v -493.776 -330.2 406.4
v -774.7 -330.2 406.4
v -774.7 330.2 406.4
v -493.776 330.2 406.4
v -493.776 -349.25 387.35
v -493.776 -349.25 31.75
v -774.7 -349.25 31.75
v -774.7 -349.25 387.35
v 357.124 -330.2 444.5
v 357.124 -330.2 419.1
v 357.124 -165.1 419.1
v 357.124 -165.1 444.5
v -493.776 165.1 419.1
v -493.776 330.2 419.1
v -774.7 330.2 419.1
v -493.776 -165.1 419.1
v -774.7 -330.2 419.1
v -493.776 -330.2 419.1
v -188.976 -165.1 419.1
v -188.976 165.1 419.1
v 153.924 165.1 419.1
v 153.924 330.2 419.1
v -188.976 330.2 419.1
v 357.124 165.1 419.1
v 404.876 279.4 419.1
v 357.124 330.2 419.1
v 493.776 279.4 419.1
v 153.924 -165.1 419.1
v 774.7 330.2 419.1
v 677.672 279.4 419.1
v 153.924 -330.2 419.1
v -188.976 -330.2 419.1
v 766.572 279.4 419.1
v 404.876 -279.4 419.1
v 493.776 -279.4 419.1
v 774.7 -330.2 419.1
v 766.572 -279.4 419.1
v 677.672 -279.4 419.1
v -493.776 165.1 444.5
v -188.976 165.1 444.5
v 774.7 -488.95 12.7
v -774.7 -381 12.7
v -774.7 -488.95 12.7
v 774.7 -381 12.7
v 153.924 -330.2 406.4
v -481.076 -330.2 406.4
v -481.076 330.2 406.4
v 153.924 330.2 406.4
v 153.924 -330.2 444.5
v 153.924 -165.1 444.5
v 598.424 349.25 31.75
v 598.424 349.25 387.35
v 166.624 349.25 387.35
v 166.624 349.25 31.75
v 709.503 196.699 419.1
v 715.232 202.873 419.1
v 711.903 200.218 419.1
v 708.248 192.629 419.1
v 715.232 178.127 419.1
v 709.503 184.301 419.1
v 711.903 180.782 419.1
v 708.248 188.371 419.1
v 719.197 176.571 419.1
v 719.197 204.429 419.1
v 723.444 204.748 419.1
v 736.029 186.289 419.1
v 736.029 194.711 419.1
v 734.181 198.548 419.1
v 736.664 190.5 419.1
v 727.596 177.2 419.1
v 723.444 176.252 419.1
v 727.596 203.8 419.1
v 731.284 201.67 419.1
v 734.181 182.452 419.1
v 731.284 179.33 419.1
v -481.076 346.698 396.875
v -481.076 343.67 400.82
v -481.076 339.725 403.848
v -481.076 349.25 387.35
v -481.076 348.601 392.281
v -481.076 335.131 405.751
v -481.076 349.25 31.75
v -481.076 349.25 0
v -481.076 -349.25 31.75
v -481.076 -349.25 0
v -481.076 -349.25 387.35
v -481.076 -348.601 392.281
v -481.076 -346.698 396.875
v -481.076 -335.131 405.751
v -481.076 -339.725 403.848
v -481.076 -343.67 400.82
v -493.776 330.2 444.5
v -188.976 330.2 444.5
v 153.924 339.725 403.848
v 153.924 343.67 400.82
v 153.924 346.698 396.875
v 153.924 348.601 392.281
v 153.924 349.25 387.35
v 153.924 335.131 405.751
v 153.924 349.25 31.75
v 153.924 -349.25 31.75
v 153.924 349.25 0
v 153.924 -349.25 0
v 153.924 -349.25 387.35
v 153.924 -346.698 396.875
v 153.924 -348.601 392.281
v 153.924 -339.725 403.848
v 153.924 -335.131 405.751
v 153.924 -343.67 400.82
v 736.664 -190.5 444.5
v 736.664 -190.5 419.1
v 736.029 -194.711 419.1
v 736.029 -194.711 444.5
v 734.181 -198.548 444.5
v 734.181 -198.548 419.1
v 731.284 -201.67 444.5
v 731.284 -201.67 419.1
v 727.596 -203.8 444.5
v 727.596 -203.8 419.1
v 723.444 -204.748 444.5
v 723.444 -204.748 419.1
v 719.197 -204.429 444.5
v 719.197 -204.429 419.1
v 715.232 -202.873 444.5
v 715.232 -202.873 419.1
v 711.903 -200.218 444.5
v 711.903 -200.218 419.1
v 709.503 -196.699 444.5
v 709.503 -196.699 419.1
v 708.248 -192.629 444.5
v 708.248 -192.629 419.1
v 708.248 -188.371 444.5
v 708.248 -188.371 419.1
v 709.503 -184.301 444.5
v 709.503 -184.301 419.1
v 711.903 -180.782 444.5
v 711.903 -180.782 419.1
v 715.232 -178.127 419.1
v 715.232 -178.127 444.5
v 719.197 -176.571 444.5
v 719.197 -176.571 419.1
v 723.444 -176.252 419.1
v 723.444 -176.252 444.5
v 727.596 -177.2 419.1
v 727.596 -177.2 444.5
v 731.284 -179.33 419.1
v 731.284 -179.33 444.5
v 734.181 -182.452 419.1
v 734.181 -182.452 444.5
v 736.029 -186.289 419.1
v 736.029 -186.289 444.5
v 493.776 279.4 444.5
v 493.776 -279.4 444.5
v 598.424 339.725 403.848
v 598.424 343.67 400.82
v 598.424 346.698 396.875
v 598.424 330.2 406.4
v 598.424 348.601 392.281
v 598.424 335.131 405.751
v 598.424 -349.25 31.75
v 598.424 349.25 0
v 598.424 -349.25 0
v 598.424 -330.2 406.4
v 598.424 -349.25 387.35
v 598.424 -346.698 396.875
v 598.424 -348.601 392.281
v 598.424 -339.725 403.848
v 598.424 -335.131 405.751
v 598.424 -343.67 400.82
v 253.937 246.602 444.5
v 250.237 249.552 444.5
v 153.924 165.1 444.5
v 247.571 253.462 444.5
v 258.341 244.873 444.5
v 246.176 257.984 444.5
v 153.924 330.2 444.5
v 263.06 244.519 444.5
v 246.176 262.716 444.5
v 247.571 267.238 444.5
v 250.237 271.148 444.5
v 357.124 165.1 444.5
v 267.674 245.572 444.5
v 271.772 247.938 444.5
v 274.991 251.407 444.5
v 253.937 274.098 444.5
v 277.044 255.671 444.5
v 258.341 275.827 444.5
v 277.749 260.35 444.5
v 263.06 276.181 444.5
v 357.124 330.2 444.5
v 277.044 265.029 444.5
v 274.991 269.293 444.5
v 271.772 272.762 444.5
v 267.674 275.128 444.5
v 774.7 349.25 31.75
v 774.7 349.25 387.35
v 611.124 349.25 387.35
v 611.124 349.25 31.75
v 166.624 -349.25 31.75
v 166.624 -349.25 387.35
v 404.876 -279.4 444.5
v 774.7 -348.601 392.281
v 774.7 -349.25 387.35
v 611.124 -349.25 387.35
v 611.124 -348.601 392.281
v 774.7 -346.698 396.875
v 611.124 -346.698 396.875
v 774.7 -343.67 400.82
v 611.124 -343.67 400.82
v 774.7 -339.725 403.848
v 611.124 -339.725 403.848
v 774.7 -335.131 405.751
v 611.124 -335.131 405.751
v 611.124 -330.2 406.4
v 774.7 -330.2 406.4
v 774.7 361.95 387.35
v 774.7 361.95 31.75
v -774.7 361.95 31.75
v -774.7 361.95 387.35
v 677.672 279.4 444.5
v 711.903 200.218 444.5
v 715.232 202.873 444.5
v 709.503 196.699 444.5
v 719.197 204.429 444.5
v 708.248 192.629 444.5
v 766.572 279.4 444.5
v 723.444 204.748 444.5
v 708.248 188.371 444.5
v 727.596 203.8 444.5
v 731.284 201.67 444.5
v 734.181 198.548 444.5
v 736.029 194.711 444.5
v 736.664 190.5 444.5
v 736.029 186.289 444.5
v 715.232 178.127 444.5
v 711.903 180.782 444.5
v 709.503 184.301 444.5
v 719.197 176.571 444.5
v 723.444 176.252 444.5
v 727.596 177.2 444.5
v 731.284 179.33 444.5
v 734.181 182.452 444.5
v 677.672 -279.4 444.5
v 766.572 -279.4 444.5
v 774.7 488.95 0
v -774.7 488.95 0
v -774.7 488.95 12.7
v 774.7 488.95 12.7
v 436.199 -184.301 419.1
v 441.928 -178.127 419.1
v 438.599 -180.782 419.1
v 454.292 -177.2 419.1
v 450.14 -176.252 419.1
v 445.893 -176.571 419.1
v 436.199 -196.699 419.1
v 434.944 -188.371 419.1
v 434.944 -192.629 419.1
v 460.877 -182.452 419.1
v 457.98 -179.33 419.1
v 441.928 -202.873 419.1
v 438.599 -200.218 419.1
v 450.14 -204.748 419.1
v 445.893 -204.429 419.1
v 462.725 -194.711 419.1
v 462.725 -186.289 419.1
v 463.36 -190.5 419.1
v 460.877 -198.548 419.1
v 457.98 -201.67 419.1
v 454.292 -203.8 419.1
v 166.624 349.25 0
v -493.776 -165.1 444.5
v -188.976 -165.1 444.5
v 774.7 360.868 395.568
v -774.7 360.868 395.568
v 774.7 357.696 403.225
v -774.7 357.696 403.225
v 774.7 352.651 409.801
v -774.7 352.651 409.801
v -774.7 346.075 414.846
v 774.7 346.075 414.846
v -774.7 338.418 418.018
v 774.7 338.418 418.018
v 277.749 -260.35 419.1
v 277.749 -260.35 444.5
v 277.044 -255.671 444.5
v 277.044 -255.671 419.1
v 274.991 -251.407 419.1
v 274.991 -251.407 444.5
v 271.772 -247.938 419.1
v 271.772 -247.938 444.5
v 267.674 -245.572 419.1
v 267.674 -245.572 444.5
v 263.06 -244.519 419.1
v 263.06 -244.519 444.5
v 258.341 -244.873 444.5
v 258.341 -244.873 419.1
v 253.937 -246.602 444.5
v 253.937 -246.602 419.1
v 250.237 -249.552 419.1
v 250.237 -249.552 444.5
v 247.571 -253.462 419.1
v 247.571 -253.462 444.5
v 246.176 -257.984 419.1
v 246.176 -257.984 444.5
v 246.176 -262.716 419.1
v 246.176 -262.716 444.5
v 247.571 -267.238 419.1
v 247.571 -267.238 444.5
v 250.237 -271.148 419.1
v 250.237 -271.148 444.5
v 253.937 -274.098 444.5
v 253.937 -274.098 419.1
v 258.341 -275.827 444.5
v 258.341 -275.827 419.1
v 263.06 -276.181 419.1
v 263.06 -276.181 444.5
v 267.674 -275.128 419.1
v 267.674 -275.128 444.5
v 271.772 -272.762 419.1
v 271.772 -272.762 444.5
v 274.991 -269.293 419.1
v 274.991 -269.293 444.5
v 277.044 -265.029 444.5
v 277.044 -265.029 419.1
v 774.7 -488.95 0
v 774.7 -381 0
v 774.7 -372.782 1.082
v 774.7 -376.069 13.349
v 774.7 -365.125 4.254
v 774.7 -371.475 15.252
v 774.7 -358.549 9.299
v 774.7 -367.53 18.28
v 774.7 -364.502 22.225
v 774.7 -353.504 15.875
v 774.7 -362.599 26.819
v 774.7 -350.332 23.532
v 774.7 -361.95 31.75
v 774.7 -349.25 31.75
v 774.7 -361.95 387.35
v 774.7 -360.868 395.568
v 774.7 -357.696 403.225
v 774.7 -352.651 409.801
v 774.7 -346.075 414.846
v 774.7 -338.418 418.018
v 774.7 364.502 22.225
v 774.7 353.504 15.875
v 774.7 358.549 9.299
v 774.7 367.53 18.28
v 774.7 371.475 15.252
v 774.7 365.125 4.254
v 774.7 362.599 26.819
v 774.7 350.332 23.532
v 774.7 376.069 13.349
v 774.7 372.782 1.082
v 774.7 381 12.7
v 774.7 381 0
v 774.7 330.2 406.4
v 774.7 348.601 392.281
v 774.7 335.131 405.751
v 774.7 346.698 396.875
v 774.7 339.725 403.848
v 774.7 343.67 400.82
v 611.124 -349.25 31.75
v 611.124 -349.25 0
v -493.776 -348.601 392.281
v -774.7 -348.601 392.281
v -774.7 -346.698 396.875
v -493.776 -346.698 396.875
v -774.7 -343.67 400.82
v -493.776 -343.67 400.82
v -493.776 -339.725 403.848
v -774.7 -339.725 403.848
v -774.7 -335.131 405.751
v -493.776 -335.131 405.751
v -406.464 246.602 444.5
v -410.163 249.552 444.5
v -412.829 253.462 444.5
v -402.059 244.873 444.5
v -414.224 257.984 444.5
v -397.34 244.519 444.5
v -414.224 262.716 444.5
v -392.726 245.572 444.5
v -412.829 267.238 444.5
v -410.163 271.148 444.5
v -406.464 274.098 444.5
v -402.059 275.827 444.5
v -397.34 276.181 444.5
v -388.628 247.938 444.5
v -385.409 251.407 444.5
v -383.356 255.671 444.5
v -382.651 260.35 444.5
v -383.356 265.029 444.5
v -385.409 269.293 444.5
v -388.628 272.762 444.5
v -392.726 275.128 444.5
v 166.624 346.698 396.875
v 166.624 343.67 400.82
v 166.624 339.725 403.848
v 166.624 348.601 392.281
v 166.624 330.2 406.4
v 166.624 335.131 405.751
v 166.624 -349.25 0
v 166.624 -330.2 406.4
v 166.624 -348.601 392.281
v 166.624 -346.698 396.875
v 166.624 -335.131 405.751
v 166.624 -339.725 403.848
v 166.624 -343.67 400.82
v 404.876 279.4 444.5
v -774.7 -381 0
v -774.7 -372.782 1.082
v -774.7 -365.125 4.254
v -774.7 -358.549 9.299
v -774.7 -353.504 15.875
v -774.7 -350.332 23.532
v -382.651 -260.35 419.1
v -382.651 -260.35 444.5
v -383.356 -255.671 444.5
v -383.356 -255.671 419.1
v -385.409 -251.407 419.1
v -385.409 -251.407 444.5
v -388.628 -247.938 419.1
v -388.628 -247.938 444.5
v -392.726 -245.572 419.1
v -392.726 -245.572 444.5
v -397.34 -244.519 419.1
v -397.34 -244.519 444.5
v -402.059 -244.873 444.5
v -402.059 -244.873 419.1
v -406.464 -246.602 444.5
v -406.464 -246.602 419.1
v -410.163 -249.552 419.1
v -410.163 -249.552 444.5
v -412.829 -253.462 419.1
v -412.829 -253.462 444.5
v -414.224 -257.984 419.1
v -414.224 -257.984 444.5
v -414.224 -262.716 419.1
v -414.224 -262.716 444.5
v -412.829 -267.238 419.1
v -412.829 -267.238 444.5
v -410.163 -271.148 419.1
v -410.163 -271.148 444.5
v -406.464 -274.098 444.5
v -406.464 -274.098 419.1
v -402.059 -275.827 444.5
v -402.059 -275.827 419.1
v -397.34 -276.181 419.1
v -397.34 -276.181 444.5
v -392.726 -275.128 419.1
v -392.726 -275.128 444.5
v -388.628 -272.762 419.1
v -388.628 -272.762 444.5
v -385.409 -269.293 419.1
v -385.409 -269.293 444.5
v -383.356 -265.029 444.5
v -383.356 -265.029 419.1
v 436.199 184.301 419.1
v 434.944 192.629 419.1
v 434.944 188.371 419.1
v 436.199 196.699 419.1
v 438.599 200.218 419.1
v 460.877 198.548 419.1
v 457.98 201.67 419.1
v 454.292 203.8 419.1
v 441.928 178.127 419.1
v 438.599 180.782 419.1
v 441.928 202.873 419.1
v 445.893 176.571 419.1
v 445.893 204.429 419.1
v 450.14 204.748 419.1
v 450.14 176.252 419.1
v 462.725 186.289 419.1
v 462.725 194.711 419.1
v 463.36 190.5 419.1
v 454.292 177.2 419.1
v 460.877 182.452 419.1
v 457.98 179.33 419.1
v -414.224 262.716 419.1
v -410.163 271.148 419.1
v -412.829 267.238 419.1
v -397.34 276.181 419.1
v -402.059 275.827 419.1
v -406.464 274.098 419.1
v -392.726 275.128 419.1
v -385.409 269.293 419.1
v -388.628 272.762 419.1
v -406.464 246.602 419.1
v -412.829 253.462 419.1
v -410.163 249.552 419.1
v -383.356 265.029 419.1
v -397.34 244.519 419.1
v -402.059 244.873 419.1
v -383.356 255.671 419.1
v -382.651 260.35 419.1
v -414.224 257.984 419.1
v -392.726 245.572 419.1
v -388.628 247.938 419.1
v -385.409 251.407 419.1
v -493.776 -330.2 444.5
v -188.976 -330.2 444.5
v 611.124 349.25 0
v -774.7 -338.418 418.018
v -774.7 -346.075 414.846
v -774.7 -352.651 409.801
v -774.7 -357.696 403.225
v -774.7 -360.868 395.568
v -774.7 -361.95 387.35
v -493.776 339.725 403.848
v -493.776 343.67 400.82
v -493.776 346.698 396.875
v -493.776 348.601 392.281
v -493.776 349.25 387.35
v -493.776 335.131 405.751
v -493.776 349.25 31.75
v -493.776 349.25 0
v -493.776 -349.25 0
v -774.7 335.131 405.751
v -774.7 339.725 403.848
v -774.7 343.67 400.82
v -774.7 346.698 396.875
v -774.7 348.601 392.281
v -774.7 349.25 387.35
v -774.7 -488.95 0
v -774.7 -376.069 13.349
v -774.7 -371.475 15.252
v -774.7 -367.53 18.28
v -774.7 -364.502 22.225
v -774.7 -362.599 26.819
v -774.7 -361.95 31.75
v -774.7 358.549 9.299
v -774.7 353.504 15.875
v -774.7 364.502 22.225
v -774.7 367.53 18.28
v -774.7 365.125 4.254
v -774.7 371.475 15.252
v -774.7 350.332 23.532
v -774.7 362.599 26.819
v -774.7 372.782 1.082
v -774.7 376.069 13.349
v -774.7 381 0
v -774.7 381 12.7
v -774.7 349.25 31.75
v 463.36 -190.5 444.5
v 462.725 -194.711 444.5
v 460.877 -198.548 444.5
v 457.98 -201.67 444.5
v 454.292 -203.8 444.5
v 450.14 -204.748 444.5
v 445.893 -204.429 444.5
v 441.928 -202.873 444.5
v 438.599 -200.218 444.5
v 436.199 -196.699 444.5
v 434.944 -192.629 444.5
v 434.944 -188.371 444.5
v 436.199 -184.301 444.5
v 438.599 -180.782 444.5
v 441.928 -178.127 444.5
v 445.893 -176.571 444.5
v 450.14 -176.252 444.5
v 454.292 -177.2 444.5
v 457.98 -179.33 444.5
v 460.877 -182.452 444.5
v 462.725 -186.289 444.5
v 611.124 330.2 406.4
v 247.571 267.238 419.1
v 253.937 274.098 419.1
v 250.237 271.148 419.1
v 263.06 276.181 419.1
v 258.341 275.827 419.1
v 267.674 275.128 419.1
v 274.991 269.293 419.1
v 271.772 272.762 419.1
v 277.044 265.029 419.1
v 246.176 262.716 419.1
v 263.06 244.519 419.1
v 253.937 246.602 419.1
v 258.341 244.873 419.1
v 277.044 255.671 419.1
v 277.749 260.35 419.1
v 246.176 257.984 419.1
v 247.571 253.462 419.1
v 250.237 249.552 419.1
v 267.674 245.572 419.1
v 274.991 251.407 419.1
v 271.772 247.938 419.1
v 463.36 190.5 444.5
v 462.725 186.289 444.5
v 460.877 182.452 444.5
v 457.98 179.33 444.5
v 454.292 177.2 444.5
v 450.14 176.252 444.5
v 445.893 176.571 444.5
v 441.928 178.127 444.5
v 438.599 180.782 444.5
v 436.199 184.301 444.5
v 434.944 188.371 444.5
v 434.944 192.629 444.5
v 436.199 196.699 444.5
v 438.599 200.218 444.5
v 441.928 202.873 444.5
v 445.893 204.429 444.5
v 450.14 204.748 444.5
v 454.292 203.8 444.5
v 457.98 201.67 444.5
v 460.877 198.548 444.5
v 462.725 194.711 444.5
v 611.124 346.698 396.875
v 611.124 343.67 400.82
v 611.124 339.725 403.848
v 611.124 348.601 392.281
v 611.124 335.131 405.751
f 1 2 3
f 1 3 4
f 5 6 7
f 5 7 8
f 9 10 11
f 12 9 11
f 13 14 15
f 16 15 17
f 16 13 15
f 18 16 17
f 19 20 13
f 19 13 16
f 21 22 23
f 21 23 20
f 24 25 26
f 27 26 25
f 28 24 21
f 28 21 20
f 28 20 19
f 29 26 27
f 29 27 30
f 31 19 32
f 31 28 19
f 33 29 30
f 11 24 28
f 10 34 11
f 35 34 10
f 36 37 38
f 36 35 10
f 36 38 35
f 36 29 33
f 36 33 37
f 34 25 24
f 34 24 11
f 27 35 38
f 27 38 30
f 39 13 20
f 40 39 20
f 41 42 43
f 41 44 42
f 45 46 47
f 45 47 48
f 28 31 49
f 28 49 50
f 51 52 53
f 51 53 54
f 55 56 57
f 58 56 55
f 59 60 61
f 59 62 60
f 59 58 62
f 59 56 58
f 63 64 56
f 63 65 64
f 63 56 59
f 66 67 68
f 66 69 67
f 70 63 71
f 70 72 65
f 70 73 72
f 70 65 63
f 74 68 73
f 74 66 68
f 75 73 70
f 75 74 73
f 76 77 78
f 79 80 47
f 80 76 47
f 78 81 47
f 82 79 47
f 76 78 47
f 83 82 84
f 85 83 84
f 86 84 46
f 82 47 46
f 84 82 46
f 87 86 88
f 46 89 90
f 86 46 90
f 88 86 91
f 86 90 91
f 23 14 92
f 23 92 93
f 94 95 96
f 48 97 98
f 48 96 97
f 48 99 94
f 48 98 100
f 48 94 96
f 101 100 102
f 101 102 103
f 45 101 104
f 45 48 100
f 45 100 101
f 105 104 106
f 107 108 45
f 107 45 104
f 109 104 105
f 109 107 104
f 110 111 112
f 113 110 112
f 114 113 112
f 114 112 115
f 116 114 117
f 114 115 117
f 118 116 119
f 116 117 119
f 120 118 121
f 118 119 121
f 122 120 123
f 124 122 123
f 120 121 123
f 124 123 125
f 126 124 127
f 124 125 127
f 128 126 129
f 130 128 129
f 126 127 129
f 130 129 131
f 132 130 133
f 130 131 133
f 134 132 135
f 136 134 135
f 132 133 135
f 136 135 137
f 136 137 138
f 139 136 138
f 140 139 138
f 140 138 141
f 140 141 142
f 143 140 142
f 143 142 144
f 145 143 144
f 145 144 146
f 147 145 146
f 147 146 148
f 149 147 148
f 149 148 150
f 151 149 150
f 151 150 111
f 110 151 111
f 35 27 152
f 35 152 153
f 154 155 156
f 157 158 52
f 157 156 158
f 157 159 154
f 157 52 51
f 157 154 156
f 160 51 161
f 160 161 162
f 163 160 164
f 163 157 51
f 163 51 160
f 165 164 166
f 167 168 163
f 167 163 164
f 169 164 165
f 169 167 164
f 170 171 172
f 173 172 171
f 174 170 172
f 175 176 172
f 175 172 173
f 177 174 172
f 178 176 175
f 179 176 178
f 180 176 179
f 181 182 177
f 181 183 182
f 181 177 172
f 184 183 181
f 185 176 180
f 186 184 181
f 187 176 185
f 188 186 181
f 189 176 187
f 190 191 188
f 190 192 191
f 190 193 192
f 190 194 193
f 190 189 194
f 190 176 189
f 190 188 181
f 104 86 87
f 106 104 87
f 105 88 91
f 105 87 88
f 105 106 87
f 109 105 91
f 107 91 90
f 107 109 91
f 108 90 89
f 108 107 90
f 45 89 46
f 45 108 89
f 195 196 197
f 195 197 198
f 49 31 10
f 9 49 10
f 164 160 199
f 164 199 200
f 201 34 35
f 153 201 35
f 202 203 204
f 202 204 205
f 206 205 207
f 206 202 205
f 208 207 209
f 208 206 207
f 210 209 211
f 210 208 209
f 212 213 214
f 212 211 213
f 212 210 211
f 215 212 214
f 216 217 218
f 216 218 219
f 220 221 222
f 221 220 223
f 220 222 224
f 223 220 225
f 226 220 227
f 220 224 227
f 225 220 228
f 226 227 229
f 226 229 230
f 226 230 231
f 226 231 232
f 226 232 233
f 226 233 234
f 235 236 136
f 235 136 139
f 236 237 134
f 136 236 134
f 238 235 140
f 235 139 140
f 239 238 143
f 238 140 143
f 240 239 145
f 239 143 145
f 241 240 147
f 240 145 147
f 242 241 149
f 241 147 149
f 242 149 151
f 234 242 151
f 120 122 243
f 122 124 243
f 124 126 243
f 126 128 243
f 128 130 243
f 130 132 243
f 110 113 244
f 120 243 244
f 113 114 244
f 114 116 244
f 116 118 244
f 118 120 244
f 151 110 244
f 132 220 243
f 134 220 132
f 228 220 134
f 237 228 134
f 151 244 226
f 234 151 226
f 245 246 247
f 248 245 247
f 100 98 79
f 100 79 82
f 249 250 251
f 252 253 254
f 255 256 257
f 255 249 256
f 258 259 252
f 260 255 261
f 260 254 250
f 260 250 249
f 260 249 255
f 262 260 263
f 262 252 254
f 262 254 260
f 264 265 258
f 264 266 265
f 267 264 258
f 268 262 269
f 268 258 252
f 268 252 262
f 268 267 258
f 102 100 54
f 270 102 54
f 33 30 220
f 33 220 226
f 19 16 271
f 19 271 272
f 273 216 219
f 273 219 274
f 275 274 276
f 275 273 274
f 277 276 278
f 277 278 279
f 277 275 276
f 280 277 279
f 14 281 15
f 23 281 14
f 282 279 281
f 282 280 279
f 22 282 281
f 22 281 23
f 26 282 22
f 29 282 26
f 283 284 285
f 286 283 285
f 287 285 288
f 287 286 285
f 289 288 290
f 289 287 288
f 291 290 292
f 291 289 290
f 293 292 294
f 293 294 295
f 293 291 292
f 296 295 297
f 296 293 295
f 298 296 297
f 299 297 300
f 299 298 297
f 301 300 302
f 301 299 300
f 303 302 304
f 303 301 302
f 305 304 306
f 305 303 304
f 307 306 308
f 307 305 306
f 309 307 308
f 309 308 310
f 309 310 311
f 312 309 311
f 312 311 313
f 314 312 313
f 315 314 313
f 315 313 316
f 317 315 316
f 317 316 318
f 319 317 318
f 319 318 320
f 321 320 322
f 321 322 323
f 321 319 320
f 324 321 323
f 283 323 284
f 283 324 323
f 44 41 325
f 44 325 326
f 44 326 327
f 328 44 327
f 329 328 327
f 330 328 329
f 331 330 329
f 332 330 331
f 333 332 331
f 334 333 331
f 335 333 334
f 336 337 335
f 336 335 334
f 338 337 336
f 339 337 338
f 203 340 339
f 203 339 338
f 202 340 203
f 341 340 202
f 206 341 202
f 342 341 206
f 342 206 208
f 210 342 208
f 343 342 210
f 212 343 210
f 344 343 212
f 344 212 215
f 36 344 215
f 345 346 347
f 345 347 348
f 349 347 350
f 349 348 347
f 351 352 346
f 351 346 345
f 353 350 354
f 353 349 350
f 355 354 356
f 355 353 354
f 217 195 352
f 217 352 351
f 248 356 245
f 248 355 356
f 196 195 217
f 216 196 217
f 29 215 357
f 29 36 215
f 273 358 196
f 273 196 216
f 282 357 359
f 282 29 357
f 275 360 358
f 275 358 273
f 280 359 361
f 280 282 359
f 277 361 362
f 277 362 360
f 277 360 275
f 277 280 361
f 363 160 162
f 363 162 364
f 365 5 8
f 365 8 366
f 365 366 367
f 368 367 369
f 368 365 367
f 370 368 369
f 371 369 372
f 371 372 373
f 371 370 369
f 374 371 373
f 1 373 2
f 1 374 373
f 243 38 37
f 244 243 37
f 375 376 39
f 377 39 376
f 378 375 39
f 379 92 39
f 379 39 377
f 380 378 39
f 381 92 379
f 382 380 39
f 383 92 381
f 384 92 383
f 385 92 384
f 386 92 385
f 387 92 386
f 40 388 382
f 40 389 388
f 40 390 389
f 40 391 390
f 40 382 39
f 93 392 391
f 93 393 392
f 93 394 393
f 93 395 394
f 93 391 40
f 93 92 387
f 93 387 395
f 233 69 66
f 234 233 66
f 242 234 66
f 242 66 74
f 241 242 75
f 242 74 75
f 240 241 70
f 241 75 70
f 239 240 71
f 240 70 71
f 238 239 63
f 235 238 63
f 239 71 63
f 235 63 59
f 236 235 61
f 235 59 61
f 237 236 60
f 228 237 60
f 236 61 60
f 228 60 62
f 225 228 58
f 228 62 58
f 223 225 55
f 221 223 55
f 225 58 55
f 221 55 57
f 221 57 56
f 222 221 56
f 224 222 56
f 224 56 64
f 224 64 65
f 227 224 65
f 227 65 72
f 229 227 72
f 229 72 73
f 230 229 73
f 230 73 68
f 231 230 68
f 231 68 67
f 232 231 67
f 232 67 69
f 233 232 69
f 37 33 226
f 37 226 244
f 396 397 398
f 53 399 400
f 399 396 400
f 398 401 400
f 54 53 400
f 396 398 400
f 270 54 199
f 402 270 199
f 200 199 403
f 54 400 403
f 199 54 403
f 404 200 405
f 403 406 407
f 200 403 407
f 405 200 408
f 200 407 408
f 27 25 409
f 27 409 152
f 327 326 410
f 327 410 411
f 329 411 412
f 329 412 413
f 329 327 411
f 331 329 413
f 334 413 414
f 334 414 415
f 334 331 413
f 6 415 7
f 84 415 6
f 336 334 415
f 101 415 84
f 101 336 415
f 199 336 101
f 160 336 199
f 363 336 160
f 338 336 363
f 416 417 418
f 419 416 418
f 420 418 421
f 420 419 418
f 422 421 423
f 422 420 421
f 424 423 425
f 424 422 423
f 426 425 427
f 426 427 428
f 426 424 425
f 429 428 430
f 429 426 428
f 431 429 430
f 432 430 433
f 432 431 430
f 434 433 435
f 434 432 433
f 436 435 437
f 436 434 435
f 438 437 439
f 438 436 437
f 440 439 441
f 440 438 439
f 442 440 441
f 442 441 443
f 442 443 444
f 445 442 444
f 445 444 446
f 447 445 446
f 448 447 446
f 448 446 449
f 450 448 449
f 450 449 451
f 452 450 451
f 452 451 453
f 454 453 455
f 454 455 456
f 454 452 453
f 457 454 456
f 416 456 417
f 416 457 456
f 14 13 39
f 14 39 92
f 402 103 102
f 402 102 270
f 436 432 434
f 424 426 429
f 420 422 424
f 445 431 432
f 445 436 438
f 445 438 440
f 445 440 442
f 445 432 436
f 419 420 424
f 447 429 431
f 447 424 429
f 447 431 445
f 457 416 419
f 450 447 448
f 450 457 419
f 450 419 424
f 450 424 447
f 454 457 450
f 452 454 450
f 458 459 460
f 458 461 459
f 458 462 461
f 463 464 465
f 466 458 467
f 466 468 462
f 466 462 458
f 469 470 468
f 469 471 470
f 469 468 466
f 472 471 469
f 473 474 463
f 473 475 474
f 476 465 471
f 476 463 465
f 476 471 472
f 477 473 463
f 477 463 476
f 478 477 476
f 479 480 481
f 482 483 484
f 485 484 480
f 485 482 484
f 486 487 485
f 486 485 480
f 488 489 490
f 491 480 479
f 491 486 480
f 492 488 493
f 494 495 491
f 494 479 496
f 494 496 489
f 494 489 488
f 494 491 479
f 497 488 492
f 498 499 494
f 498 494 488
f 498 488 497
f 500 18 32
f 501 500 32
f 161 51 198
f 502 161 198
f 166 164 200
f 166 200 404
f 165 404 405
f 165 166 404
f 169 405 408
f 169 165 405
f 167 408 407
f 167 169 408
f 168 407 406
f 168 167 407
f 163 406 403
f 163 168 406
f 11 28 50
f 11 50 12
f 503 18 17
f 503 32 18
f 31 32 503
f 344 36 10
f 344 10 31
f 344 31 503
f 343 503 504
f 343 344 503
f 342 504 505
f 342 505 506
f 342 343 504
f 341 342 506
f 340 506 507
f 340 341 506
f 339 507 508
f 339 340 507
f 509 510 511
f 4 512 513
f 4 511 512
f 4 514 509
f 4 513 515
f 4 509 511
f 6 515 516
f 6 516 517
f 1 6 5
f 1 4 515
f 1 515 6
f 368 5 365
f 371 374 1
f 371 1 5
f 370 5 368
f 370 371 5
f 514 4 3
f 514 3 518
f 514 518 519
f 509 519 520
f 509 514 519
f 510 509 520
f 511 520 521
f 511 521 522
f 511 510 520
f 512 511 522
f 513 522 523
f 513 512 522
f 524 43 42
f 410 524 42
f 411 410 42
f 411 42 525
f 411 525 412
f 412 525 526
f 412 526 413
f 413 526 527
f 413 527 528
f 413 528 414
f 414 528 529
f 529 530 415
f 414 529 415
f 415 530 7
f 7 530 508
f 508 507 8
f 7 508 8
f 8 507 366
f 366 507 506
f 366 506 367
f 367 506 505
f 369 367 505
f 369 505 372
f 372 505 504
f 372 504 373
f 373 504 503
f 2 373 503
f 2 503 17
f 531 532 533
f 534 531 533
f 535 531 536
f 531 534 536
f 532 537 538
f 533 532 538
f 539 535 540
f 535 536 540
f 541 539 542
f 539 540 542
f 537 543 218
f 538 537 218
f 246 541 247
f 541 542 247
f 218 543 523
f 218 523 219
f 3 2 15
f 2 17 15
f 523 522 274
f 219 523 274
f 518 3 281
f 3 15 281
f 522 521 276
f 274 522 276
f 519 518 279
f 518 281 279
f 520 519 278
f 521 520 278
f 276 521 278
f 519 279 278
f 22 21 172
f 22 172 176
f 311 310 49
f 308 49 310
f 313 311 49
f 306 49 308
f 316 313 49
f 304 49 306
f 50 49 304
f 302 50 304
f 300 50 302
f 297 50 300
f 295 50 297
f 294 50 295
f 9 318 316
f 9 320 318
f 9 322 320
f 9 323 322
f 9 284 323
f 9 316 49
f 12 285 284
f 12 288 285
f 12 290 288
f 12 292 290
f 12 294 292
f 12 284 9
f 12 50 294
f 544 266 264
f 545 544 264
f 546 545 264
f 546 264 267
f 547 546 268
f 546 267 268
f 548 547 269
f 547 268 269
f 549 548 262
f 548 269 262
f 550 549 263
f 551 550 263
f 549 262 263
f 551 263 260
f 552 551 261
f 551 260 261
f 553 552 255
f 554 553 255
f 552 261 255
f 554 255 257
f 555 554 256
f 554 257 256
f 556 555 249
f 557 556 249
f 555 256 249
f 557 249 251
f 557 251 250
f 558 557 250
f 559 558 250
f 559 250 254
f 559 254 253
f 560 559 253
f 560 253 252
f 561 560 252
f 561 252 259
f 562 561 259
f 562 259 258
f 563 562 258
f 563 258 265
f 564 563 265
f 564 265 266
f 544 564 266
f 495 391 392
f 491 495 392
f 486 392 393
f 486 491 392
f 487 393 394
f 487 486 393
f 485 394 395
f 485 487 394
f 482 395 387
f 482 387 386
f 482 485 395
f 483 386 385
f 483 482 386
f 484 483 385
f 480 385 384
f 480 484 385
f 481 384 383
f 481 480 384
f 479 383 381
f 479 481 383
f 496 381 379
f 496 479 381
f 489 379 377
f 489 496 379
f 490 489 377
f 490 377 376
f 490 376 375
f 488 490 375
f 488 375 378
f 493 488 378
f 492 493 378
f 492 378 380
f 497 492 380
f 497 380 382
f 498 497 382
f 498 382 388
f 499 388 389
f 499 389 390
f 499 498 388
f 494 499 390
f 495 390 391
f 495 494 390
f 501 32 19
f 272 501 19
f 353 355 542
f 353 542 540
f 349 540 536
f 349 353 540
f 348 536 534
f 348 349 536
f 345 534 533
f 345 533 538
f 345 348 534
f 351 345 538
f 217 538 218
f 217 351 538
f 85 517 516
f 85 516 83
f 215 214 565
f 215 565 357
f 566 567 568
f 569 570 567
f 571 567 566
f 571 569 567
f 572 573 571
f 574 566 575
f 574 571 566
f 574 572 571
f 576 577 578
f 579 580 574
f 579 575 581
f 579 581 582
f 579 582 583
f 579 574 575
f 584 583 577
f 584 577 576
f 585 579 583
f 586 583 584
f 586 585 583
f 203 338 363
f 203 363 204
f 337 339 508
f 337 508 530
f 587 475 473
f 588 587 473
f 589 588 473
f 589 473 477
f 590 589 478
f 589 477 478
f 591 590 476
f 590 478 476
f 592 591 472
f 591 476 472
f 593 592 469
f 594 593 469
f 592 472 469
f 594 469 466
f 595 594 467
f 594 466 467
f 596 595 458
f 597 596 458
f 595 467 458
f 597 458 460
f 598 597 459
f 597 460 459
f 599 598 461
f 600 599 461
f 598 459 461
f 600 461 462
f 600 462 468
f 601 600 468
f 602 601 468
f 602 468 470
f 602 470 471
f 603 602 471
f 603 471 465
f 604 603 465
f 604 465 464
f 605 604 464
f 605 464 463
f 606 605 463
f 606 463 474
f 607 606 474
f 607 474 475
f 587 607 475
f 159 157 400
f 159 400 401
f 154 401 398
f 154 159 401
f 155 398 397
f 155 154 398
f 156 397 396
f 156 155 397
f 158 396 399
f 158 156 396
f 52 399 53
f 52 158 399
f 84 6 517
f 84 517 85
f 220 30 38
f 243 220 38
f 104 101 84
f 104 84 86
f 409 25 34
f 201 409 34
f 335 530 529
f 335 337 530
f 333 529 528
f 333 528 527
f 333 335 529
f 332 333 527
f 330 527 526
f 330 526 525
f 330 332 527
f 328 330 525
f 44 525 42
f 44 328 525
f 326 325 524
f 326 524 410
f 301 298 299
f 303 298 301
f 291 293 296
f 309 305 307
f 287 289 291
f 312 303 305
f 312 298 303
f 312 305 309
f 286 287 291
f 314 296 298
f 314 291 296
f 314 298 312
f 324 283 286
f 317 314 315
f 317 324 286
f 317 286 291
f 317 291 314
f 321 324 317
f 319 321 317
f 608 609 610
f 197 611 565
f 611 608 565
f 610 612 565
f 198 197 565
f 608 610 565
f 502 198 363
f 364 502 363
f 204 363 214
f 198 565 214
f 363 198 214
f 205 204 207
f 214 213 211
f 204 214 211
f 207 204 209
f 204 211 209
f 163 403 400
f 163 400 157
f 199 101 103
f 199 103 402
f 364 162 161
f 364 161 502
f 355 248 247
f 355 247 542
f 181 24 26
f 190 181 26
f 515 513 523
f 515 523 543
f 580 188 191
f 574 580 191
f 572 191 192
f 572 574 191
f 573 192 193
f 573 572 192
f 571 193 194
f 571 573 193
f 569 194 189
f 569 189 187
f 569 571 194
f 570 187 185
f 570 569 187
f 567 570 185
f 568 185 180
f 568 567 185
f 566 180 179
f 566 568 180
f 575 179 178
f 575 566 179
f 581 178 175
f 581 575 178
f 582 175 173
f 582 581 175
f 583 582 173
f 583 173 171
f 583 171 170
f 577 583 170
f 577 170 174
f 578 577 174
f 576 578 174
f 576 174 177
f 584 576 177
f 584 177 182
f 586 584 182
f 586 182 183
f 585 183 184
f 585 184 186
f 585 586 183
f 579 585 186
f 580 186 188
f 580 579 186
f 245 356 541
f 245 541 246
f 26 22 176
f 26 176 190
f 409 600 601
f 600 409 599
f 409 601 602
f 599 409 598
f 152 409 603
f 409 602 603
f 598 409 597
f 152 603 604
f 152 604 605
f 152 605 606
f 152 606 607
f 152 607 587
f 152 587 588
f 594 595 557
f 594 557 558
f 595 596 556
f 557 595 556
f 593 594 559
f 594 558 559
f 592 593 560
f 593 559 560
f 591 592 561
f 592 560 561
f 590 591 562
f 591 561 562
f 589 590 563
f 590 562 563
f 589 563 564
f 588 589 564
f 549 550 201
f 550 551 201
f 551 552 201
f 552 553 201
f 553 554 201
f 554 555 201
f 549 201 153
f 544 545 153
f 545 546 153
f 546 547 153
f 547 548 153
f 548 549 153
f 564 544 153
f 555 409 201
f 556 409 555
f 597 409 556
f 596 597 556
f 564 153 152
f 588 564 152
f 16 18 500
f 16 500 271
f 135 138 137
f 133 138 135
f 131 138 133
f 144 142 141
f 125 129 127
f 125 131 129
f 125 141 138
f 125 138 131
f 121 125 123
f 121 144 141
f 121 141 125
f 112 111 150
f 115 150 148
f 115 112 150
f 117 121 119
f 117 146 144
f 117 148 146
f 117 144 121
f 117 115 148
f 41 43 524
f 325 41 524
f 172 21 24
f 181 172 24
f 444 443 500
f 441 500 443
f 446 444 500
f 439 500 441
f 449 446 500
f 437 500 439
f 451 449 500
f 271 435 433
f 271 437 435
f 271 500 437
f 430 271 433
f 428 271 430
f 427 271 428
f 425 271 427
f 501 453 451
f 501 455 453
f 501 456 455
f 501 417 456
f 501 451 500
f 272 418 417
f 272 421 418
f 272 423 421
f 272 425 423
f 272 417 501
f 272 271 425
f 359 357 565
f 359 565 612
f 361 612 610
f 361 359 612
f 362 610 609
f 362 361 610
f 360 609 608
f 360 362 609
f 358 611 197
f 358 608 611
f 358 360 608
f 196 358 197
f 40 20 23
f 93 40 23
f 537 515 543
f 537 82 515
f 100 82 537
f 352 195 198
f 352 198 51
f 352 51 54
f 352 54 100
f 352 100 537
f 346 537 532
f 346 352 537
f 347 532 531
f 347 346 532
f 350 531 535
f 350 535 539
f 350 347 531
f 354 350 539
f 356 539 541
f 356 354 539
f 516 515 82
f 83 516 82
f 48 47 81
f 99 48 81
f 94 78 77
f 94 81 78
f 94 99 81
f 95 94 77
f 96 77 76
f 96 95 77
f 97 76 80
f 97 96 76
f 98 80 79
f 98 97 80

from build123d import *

# Parameters (mm, degrees)
F1_DEPTH = 774.7
F2_W     = 304.8
F2_H     = 165.1
F2_R     = 15.875
F2_W_2   = 203.2
F3_DEPTH = 25.4
F4_W     = 88.9
F4_H     = 558.8
F4_R     = 14.2875
F5_DEPTH = 38.1
F6_W     = 12.7
F6_H     = 698.5
F7_DEPTH = 406.4


with BuildPart() as f1:
    # F0 (on Right) → F1 (new body, symmetric)
    with BuildSketch(Plane.YZ):
        with BuildLine():
            Line((-488.95, 12.7), (-488.95, 0))
            Line((-488.95, 0), (-381, 0))
            ThreePointArc((-381, 0), (-358.54936, 9.29936), (-349.25, 31.75))
            Line((-349.25, 31.75), (-349.25, 387.35))
            ThreePointArc((-349.25, 387.35), (-343.670384, 400.820384), (-330.2, 406.4))
            Line((-330.2, 406.4), (0, 406.4))
            Line((0, 406.4), (0, 419.1))
            Line((0, 419.1), (-330.2, 419.1))
            ThreePointArc((-330.2, 419.1), (-352.65064, 409.80064), (-361.95, 387.35))
            Line((-361.95, 387.35), (-361.95, 31.75))
            ThreePointArc((-361.95, 31.75), (-367.529616, 18.279616), (-381, 12.7))
            Line((-381, 12.7), (-488.95, 12.7))
        make_face()
        with BuildLine():
            Line((0, 419.1), (0, 406.4))
            Line((0, 406.4), (330.2, 406.4))
            ThreePointArc((330.2, 406.4), (343.670384, 400.820384), (349.25, 387.35))
            Line((349.25, 387.35), (349.25, 31.75))
            ThreePointArc((349.25, 31.75), (358.54936, 9.29936), (381, 0))
            Line((381, 0), (488.95, 0))
            Line((488.95, 0), (488.95, 12.7))
            Line((488.95, 12.7), (381, 12.7))
            ThreePointArc((381, 12.7), (367.529616, 18.279616), (361.95, 31.75))
            Line((361.95, 31.75), (361.95, 387.35))
            ThreePointArc((361.95, 387.35), (352.65064, 409.80064), (330.2, 419.1))
            Line((330.2, 419.1), (0, 419.1))
        make_face()
    extrude(amount=F1_DEPTH, both=True)

    # F2 (on face) → F3 (join)
    with BuildSketch(Plane.XY.offset(419.1)):
        with Locations((-341.376, 247.65)):
            Rectangle(F2_W, F2_H)
        with Locations((-398.526, 260.35)):
            Circle(F2_R, mode=Mode.SUBTRACT)
        with Locations((255.524, 247.65)):
            Rectangle(F2_W_2, F2_H)
        with Locations((261.874, 260.35)):
            Circle(F2_R, mode=Mode.SUBTRACT)
        with Locations((-341.376, -247.65)):
            Rectangle(F2_W, F2_H)
        with Locations((-398.526, -260.35)):
            Circle(F2_R, mode=Mode.SUBTRACT)
        with Locations((255.524, -247.65)):
            Rectangle(F2_W_2, F2_H)
        with Locations((261.874, -260.35)):
            Circle(F2_R, mode=Mode.SUBTRACT)
    extrude(amount=F3_DEPTH)

    # F4 (on face) → F5 (join, through all)
    with BuildSketch(Plane(origin=(0, 0, 406.4), x_dir=(1, 0, 0), z_dir=(0, 0, -1))):
        with Locations((449.326, 0)):
            Rectangle(F4_W, F4_H)
        with Locations((449.072, -190.5)):
            Circle(F4_R, mode=Mode.SUBTRACT)
        with Locations((449.072, 190.5)):
            Circle(F4_R, mode=Mode.SUBTRACT)
        with Locations((722.122, 0)):
            Rectangle(F4_W, F4_H)
        with Locations((722.376, -190.5)):
            Circle(F4_R, mode=Mode.SUBTRACT)
        with Locations((722.376, 190.5)):
            Circle(F4_R, mode=Mode.SUBTRACT)
    extrude(amount=-F5_DEPTH)

    # F6 (on face) → F7 (join, through all)
    with BuildSketch(Plane(origin=(0, 0, 406.4), x_dir=(1, 0, 0), z_dir=(0, 0, -1))):
        with Locations((-487.426, 0)):
            Rectangle(F6_W, F6_H)
        with Locations((160.274, 0)):
            Rectangle(F6_W, F6_H)
        with Locations((604.774, 0)):
            Rectangle(F6_W, F6_H)
    extrude(amount=F7_DEPTH)


solid = f1.part
